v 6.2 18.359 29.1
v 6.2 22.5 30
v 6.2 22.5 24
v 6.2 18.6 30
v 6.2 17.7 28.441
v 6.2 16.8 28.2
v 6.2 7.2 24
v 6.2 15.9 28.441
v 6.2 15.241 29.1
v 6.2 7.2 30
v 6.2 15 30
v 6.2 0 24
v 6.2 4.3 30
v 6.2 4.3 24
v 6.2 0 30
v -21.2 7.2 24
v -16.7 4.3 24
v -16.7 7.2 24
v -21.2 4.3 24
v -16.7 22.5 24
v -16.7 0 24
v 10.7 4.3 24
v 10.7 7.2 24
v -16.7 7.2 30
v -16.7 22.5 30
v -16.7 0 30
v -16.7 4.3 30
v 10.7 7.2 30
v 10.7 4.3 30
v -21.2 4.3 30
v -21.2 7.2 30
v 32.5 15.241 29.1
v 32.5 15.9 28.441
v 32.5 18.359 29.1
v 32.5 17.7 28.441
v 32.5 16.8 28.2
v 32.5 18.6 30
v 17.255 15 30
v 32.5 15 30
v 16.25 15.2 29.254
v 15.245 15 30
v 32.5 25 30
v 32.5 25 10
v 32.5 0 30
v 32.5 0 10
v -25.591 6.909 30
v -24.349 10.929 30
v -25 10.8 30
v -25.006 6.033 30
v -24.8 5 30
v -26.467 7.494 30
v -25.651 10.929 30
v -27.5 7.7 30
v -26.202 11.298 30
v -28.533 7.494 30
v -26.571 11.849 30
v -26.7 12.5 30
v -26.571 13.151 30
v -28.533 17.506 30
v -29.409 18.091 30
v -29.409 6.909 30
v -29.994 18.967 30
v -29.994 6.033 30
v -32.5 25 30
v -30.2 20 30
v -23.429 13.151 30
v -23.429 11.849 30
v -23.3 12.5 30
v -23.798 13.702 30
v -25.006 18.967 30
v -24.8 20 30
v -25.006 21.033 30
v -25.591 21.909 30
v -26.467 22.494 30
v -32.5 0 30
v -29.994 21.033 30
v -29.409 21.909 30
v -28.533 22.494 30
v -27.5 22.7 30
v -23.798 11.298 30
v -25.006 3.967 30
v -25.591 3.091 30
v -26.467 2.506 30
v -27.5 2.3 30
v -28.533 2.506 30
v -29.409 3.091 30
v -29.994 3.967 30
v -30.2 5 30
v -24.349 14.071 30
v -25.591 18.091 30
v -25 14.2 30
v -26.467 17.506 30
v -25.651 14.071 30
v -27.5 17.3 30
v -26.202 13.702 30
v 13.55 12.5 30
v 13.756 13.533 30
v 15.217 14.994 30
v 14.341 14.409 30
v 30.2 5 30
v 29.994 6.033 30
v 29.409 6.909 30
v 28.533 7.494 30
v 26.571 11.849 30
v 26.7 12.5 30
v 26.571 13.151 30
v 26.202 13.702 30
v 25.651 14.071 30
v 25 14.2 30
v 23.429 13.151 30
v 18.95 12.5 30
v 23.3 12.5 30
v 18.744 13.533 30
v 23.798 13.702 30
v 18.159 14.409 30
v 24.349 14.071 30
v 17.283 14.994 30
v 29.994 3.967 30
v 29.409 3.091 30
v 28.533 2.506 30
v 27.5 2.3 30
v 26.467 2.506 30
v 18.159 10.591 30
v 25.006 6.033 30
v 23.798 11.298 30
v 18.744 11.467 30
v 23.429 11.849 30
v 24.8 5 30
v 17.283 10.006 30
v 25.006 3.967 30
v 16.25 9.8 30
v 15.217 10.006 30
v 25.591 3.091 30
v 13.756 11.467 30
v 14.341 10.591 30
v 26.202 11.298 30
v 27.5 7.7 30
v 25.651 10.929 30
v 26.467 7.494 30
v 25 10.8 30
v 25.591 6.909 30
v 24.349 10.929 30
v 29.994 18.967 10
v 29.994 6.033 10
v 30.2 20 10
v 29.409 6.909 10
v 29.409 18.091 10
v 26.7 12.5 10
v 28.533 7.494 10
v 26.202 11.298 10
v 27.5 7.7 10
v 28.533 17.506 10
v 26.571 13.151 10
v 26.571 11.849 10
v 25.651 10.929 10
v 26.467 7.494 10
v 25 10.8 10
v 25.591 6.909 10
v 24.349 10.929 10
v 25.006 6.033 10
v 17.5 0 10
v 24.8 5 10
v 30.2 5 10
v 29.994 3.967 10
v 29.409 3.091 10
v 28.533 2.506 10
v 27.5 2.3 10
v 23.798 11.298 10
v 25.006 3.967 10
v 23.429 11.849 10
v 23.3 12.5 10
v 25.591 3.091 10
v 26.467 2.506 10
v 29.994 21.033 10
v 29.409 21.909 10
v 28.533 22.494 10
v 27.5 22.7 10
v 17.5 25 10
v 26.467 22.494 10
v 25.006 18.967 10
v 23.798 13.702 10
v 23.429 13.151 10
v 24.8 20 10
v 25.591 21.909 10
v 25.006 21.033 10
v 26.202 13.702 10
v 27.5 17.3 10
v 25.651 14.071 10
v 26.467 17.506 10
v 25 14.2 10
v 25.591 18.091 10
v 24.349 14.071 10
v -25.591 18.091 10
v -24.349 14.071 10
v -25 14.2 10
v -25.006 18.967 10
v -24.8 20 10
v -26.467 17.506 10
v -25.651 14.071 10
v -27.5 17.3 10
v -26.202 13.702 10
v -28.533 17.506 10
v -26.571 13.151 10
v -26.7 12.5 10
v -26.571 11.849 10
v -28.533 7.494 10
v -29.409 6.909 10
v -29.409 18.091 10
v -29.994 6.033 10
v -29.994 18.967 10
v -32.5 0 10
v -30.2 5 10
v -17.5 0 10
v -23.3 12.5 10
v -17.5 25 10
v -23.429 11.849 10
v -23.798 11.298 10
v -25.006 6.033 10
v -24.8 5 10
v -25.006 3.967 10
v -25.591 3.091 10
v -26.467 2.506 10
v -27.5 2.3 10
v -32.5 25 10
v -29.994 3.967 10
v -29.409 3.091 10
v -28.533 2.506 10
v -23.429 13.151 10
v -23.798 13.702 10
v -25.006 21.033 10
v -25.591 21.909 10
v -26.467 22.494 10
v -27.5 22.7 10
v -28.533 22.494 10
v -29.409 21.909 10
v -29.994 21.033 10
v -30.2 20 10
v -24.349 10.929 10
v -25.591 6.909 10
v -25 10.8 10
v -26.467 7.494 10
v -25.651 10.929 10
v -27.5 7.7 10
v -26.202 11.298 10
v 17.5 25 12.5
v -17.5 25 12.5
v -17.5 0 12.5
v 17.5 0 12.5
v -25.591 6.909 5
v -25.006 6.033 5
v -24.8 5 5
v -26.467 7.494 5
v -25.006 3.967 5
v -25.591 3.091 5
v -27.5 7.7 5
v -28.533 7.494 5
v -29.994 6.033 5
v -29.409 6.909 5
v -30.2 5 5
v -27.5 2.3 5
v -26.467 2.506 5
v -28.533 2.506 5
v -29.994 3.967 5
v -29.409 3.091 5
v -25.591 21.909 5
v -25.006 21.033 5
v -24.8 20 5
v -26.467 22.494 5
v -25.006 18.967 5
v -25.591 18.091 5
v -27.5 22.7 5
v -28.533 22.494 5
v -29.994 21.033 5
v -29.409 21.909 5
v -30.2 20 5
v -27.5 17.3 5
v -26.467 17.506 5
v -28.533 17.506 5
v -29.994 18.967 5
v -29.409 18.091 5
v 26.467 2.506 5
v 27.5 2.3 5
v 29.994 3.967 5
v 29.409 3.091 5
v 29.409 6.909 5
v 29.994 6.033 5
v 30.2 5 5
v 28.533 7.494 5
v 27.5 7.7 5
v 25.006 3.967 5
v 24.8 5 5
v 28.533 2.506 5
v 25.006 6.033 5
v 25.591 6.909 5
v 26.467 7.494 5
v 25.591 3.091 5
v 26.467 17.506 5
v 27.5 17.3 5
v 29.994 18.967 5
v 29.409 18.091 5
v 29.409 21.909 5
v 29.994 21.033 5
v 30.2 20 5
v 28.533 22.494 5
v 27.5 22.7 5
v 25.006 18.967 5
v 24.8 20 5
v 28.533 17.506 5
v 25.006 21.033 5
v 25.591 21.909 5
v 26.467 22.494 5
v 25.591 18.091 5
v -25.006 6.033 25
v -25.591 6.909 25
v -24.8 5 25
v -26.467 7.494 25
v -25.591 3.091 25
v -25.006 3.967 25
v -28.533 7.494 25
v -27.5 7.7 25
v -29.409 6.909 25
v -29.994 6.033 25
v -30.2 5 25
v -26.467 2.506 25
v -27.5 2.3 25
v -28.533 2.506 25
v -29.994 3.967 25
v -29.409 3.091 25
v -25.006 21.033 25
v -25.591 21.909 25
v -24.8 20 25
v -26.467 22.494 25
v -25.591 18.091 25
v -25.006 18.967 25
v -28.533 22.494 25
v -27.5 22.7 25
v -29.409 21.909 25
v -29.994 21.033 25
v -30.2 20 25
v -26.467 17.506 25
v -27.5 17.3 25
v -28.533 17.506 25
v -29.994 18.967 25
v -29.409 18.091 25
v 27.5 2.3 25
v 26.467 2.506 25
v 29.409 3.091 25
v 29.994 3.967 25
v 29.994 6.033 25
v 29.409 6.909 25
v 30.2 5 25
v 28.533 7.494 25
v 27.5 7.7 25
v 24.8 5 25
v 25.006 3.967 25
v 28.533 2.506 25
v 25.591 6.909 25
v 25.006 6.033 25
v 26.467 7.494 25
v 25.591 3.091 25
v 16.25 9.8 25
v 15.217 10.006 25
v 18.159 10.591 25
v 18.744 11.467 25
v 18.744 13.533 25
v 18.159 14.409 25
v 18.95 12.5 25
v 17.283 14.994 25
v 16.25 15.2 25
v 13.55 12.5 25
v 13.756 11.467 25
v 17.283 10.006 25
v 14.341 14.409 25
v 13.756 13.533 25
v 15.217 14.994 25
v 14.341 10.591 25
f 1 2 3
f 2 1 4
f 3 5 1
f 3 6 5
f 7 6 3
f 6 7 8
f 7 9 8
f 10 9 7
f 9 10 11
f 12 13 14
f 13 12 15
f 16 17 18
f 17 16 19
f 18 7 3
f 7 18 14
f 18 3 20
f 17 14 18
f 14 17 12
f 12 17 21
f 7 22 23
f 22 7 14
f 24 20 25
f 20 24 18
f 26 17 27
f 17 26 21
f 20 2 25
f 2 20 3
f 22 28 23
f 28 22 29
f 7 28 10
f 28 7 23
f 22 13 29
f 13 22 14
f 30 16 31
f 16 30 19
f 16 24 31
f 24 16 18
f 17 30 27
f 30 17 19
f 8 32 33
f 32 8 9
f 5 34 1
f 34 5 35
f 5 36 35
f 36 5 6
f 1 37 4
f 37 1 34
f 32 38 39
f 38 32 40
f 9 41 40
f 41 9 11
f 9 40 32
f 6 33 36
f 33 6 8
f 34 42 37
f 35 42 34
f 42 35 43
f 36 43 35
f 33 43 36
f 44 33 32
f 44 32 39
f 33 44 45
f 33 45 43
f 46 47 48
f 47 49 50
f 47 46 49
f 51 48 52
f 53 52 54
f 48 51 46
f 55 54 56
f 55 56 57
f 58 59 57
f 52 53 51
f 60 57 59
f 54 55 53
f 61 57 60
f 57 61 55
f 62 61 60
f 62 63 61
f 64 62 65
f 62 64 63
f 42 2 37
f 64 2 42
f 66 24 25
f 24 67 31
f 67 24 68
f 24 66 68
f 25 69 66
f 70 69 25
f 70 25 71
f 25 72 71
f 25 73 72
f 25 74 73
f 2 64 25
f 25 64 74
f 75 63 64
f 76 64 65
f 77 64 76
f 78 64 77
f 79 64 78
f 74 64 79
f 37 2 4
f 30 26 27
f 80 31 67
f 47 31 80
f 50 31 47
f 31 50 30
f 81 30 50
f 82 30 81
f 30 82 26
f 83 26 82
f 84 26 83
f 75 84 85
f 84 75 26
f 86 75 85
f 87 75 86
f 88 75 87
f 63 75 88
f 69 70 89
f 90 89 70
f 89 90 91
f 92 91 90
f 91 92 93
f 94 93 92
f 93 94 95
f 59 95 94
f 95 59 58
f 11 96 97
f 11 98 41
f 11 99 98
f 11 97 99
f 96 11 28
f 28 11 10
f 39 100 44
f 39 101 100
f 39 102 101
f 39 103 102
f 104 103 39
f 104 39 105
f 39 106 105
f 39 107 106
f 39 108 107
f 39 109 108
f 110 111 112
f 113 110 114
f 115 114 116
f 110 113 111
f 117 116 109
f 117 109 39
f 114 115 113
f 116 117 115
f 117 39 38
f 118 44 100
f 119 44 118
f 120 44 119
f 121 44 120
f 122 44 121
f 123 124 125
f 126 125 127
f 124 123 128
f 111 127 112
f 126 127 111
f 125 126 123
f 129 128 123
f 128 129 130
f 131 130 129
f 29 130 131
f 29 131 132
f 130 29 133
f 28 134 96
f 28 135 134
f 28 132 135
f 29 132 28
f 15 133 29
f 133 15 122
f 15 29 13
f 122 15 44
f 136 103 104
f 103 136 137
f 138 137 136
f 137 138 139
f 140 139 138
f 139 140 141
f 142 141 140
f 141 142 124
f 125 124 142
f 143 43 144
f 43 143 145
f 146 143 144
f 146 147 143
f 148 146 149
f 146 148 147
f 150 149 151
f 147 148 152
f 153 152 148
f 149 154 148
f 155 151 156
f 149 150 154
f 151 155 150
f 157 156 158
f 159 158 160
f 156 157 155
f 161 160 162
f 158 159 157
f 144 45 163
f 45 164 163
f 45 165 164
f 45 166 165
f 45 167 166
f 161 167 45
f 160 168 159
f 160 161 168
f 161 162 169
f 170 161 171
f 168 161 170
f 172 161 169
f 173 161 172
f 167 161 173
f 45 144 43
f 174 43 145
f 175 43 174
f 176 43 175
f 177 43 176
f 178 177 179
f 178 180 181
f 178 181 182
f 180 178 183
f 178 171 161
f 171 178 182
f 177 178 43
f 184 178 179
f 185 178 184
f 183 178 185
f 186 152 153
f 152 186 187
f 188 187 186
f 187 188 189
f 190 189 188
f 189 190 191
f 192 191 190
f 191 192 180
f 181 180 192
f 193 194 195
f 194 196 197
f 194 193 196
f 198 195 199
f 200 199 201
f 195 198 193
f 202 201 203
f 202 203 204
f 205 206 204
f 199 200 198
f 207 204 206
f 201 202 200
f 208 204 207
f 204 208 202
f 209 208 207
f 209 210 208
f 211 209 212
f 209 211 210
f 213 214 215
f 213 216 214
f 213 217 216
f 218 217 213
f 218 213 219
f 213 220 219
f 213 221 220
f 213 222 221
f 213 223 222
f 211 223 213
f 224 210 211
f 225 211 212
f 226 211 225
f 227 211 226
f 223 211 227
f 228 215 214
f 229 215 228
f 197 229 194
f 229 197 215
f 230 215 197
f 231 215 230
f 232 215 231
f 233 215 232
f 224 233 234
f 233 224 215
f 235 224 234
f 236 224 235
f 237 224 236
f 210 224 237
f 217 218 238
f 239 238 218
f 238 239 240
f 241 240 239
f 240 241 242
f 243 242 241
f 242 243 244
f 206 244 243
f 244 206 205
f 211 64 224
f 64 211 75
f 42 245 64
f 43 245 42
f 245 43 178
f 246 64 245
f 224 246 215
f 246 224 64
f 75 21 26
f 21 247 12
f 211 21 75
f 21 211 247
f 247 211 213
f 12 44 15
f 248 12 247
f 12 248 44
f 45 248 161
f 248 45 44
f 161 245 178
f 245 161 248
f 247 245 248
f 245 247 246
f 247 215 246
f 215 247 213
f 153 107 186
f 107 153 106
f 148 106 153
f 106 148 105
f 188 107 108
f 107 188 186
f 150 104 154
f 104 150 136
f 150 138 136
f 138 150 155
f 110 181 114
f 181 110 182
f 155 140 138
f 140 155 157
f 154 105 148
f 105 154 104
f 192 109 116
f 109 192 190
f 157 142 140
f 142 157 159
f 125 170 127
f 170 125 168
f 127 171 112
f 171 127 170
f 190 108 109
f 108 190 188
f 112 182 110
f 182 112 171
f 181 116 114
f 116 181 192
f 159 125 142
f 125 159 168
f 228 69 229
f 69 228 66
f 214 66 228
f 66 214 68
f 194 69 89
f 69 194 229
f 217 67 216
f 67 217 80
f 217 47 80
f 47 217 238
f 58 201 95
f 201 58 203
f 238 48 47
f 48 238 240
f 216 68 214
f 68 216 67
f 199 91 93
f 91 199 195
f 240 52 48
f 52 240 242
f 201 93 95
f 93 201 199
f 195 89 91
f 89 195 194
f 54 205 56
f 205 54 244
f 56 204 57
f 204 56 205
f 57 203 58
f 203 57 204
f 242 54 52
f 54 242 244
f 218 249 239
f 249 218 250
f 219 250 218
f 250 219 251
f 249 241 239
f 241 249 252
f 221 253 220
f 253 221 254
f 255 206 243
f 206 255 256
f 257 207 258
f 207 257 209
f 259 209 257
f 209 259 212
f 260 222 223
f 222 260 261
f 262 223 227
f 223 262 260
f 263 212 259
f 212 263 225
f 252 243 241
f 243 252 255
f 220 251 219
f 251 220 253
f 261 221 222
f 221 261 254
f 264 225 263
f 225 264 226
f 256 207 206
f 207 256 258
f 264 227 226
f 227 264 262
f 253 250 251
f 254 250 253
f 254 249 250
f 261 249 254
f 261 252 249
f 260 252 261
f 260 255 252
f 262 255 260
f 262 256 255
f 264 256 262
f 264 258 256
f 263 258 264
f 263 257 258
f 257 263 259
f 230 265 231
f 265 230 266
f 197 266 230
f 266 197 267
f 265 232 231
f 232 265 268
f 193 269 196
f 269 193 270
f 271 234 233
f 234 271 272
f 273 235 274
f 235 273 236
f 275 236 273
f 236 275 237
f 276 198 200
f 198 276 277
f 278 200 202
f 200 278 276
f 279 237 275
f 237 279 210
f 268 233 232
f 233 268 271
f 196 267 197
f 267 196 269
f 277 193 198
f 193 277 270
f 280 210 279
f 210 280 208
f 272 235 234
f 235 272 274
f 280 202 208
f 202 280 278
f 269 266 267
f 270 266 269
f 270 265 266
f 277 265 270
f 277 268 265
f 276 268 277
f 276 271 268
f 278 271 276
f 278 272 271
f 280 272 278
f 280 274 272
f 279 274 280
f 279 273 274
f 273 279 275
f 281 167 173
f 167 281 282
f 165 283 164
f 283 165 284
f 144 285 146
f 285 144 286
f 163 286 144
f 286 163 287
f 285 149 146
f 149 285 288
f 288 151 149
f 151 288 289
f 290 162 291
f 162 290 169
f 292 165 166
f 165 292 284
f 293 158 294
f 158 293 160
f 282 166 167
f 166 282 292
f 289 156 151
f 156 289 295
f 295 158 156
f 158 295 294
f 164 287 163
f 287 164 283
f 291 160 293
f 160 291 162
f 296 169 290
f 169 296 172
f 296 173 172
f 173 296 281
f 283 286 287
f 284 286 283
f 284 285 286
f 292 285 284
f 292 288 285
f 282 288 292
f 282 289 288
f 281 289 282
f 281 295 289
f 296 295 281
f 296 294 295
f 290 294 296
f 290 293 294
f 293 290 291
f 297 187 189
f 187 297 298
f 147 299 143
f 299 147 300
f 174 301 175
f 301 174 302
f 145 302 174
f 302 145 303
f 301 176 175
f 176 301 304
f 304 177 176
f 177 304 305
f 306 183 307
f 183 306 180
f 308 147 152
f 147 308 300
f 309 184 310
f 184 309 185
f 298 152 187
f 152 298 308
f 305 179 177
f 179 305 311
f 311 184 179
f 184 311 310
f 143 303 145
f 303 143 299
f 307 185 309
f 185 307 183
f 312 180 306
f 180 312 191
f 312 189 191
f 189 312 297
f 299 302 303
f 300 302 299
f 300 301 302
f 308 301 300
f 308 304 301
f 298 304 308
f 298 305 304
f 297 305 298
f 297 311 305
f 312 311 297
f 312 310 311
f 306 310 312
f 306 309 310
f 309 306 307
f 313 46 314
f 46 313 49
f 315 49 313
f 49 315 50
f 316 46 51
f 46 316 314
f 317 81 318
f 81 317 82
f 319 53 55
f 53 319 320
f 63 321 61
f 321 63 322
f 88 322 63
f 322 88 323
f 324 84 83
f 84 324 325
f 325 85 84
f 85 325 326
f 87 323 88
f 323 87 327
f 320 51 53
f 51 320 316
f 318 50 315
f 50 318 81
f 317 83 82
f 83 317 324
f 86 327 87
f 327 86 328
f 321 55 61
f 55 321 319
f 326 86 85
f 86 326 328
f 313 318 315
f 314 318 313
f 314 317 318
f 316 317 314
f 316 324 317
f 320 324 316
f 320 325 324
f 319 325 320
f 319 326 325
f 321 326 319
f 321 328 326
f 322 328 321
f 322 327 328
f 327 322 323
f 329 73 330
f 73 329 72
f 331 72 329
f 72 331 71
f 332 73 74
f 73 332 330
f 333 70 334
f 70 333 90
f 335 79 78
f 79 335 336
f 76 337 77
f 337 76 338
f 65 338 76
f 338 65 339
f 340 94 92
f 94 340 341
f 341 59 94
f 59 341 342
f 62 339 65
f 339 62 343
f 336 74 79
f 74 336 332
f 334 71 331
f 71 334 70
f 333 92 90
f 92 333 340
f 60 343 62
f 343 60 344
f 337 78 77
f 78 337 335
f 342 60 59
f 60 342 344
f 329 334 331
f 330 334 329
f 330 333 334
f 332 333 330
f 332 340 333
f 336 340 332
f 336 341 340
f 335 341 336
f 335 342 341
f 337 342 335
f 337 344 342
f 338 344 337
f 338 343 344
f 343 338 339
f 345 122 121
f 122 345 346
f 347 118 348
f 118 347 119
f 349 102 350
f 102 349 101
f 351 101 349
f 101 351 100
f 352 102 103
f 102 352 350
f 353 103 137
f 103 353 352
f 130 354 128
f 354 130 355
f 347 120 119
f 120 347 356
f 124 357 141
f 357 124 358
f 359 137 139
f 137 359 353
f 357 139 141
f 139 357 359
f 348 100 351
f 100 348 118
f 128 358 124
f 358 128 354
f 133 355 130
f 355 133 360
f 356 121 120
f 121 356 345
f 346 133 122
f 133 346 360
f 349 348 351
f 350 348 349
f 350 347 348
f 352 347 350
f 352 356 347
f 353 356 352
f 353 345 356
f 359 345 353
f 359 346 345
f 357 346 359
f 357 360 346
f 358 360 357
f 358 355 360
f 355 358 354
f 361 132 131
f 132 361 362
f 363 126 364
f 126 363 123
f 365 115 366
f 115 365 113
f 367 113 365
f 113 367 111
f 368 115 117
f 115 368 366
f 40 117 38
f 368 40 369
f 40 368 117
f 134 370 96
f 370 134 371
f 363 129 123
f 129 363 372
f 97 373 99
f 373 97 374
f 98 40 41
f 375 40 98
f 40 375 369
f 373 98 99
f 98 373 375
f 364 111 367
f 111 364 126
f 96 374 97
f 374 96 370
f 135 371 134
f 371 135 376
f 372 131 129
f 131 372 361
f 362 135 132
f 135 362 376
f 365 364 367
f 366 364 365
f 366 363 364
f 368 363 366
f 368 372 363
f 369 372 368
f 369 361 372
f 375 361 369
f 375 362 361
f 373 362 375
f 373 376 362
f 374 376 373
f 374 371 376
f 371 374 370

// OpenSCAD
// file: servo.scad
    box_width=22.5;
    box_depth=23.3;
    box_height=12;
    cylinder_depth=6;
    small_cylinder=3;
    cylinders_width=15;
    gear_radius=2.5;
    gear_height=3;
    fixation_depth=2.5;
    fixation_width=4.5;
    fixation_depth_position=5.5;
    vis_hole=1;
    screw_radius=0.5;
    screw_long=10;
    cable_radius=1.6;
    cable_depth=5.5;


    wheel_depth=8;
    wheel_height=6;
    wheel_radius=30;
    wheel_depth_int=4;
    wheel_gear=2;


function wheelRadius() = wheel_radius;


module servo(with_screw=false,with_cable=false,with_screw_hole=true,security=0) {        
    //big cylinder
    translate([box_width-box_height/2,0,box_height/2]){
        rotate([90,0,0]){
            #cylinder(cylinder_depth,d=box_height+2*security);
        }
    }
    //gear
    translate([box_width-box_height/2,-cylinder_depth,box_height/2]){
        rotate([90,0,0]){
            cylinder(gear_height,gear_radius,gear_radius);
        }
    }
    //small cylinder
    translate([box_width-(cylinders_width-small_cylinder),0,box_height/2]){
        rotate([90,0,0]){
            cylinder(cylinder_depth,d=small_cylinder+2*security,$fn=16);
        }
    }
    //box
    translate([-security,-security,0]) cube([box_width+2*security,box_depth+2*security,box_height+security]);
    
    //fixation droite
    translate([box_width,fixation_depth_position,0]){
        difference() {
            translate([-security,-security,0]) cube([fixation_width+2*security,fixation_depth+2*security,box_height+security]);
            if (with_screw_hole) {
                translate([fixation_width/2,fixation_depth,box_height/2]){
                    rotate([90,0,0]){
                        cylinder(fixation_depth,d=2*(vis_hole+security),$fn=12);
                    }
                }
            }
        }
        if (with_screw) {
            translate([fixation_width/2,screw_long,box_height/2]){
                rotate([90,0,0]){
                    #cylinder(screw_long,screw_radius,screw_radius,$fn=12);
                }
            }
        }
    }
    //fixation gauche
    translate([-fixation_width,fixation_depth_position,0]){
        difference() {
            translate([-security,-security,0]) cube([fixation_width+2*security,fixation_depth+2*security,box_height+security]);
            if (with_screw_hole) {
                translate([fixation_width/2,fixation_depth,box_height/2]){
                    rotate([90,0,0]){
                        cylinder(fixation_depth,d=2*(vis_hole+security),$fn=12);
                    }
                }
            }
        }
        if (with_screw) {
            translate([fixation_width/2,screw_long,box_height/2]){
                rotate([90,0,0]){
                    #cylinder(screw_long,screw_radius,screw_radius,$fn=12);
                }
            }
        }
    }
    if (with_cable) {
        translate([box_width,box_depth-cable_depth,box_height/2]){
            rotate([90,0,90]){
                cylinder(40,d=2*(cable_radius+security),$fn=12);
            }
        }
    }
}

module wheel() {    
    translate([0,0,wheel_radius]){
        rotate([90,0,0]){
            difference() {
                cylinder(wheel_depth,wheel_radius,wheel_radius);
                cylinder(wheel_depth,wheel_radius-wheel_height,wheel_radius-wheel_height);
            }
            translate([0,0,(wheel_depth-wheel_depth_int)/2]){
                cylinder(wheel_depth_int,wheel_radius-wheel_height,wheel_radius-wheel_height);
            }
        }
    }
}


module servo_wheel(with_screw=false,with_cable=false,with_screw_hole=true,security=0) {
    translate([0,-cylinder_depth,]){
        translate([-(box_width-box_height/2), (cylinder_depth+gear_height)-(wheel_depth-wheel_depth_int)/2-wheel_gear,wheel_radius-box_height/2]){
            servo(with_screw,with_cable,with_screw_hole,security=security);
        }

        wheel();
    }
}

servo_wheel(true,true,security=0.2);
// main file
use <servo.scad>

support_width=65;
support_deep=25;
screw=3;

function supportWidth() = support_width;
function supportDeep() =support_deep;

module support_servo_bas(chassis_height=10,security=0,mask_security=0,with_screw=false) {
    support_height=wheelRadius()-chassis_height;
    difference() {
        union() {
            difference() {
                translate([-support_width/2,0,chassis_height]) cube([support_width,support_deep,support_height]);
                #translate([-support_width/2+15,0,chassis_height]) cube([support_width-30,support_deep,2.5]);
                #servo_wheel(false,true, false,security=security);
                
                translate([support_width/2-7.5,support_deep/2,0]) cylinder(100,d=screw+2*security,$fn=16);
                translate([-support_width/2+7.5,support_deep/2,0]) cylinder(100,d=screw+2*security,$fn=16);
            }
            translate([-support_width/2+5,5,chassis_height-5]) cylinder(5,d=5+2*mask_security,$fn=16);
            translate([-support_width/2+5,support_deep-5,chassis_height-5]) cylinder(5,d=5+2*mask_security,$fn=16);
            translate([support_width/2-5,5,chassis_height-5]) cylinder(5,d=5+2*mask_security,$fn=16);
            translate([support_width/2-5,support_deep-5,chassis_height-5]) cylinder(5,d=5+2*mask_security,$fn=16);
            if (with_screw) {
                translate([support_width/2-7.5,support_deep/2,chassis_height-5-5]) cylinder(40,d=screw+2*mask_security,$fn=16);
                translate([-support_width/2+7.5,support_deep/2,chassis_height-5-5]) cylinder(40,d=screw+2*mask_security,$fn=16);
            }
        }
        support_servo_haut(security,0.2);
    } 
}

module support_servo_haut(security=0,mask_security=0) {
    support_height=10;
    level=wheelRadius();
    difference() {
        translate([-support_width/2,0,level]) cube([support_width,support_deep,support_height]);
        #servo_wheel(false,true, false,security=security);
        
        translate([support_width/2-7.5,support_deep/2,0]) cylinder(100,d=screw+2*security,$fn=16);
        translate([-support_width/2+7.5,support_deep/2,0]) cylinder(100,d=screw+2*security,$fn=16);
    }
    translate([-support_width/2+5,5,level-5]) cylinder(5,d=5+2*mask_security,$fn=16);
    translate([-support_width/2+5,support_deep-5,level-5]) cylinder(5,d=5+2*mask_security,$fn=16);
    translate([support_width/2-5,5,level-5]) cylinder(5,d=5+2*mask_security,$fn=16);
    #translate([support_width/4,support_deep/2,level-5]) cylinder(5,d=5+2*mask_security,$fn=16);
}

!support_servo_bas(security=0.2,mask_security=0.2,with_screw=false);
support_servo_haut();
